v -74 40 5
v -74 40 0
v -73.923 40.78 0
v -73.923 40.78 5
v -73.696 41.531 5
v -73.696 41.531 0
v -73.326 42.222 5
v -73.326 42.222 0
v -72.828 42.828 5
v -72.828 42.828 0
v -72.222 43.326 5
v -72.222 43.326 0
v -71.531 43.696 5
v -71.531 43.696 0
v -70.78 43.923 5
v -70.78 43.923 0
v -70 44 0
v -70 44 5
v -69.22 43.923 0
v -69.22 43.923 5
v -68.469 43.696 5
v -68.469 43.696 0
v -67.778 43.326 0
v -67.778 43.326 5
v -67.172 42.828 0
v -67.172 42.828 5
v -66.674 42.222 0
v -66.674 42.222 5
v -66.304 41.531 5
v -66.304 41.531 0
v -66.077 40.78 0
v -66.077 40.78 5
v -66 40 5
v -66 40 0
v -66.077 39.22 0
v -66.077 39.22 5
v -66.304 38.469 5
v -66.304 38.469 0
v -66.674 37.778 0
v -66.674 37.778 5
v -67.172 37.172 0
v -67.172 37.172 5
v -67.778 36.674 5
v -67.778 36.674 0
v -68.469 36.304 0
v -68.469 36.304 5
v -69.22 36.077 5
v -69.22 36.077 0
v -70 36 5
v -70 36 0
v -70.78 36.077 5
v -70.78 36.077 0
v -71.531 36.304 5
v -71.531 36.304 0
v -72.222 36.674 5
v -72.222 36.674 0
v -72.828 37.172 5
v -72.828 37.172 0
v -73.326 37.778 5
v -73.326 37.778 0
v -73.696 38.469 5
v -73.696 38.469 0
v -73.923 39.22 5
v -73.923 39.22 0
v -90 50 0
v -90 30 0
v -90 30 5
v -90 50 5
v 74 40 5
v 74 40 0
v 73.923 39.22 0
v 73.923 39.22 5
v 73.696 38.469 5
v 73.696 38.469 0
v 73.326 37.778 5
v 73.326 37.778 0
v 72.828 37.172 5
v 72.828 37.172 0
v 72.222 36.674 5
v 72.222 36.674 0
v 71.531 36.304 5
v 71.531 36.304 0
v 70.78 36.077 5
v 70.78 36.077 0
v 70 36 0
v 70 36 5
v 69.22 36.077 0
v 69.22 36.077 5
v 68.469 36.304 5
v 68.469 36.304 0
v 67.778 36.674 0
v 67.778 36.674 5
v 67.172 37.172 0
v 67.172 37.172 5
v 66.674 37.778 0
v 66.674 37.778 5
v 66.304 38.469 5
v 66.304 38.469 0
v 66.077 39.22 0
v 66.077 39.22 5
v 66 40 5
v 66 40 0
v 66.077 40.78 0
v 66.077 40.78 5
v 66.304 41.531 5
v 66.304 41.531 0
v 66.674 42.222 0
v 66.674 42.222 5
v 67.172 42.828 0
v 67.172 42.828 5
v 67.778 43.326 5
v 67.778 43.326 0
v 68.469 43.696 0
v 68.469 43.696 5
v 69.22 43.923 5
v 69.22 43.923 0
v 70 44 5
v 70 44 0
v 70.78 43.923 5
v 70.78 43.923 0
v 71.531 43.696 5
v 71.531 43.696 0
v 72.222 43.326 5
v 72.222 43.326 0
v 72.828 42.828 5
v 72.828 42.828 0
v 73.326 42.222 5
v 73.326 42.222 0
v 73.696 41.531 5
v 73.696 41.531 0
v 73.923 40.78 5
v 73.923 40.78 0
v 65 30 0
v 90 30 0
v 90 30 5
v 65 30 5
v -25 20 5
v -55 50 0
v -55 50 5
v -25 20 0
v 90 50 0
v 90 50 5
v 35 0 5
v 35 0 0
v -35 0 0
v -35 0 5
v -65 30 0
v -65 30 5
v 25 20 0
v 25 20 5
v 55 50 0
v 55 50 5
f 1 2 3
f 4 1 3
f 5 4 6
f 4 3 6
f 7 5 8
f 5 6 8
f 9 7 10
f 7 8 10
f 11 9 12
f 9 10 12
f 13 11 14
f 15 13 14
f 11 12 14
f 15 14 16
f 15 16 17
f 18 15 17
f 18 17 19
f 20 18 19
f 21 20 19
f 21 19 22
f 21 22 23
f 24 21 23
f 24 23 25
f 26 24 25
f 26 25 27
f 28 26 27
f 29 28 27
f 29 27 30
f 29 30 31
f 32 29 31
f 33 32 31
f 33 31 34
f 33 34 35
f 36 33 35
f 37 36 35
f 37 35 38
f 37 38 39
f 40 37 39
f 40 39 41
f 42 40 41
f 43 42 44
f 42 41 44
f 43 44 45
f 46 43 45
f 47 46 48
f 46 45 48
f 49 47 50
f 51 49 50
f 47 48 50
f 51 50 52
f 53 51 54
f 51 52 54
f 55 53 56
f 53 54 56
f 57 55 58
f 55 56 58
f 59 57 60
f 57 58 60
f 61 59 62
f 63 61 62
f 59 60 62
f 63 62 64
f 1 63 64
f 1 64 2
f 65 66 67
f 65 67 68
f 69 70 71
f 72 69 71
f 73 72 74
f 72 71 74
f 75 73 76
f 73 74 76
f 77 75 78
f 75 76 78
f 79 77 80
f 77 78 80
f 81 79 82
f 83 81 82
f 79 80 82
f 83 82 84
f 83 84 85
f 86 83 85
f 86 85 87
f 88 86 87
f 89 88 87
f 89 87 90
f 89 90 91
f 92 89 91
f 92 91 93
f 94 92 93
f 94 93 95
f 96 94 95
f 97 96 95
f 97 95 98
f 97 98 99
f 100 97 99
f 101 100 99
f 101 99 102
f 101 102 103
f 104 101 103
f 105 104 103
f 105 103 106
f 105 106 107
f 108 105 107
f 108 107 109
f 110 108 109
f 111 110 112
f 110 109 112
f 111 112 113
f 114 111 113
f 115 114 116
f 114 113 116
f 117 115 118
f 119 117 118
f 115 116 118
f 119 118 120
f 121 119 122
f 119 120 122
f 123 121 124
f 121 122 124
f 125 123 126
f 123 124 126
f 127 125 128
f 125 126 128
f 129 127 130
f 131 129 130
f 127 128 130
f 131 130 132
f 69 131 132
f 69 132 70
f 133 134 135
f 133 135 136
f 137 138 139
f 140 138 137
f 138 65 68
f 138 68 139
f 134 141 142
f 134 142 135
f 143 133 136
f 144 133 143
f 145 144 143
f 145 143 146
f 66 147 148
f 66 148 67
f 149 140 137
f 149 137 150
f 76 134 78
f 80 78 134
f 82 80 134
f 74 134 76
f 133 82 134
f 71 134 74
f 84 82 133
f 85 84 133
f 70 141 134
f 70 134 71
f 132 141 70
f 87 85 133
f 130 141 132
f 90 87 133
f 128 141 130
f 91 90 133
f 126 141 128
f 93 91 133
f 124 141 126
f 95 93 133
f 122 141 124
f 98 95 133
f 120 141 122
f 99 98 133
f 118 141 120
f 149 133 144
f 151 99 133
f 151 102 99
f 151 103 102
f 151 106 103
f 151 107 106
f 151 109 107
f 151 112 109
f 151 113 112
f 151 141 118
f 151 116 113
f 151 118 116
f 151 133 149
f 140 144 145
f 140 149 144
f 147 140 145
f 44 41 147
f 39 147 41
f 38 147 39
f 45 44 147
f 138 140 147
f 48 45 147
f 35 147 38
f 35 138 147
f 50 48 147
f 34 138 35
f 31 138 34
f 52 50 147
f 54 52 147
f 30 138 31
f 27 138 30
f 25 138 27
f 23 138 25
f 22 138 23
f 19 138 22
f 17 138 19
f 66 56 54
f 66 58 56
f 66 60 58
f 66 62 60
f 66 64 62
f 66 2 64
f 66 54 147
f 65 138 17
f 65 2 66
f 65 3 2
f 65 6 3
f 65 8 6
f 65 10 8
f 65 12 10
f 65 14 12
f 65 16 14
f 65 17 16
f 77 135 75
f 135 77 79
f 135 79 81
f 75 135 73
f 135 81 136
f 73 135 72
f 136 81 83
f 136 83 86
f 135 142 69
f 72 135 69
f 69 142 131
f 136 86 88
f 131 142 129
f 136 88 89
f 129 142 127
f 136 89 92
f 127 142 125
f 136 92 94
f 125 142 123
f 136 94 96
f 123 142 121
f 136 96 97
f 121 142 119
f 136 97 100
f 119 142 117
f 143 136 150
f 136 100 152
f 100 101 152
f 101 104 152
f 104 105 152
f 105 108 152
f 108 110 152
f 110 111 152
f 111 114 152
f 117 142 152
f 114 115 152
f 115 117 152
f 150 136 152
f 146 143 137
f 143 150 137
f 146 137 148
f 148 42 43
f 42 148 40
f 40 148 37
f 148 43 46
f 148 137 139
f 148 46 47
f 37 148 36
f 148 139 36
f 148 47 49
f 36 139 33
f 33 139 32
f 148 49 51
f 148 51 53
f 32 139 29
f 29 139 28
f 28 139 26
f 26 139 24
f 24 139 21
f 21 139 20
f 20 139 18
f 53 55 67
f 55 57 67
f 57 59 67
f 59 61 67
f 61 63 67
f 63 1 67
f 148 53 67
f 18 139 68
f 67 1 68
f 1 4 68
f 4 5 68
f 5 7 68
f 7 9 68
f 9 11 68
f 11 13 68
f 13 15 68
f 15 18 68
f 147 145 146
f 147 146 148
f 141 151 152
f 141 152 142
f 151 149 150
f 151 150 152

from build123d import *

# Parameters (mm, degrees)
EXTRUDE_1_DEPTH     = 5
SKETCH_2_R          = 4
CUT_EXTRUDE_1_DEPTH = 10


with BuildPart() as part:
    # 草图1 → 凸台-拉伸1 (new body)
    with BuildSketch(Plane.XY):
        Polygon((35, 0), (-35, 0), (-65, 30), (-90, 30), (-90, 50), (-55, 50), (-25, 20), (25, 20), (55, 50), (90, 50), (90, 30), (65, 30), align=None)
    extrude(amount=EXTRUDE_1_DEPTH)

    # 草图2 → 切除-拉伸1 (cut)
    with BuildSketch(Plane(origin=(0, 0, 0), x_dir=(-1, 0, 0), z_dir=(0, 0, -1))):
        with Locations((70, 40)):
            Circle(SKETCH_2_R)
        with Locations(Location((-70, 40, 0), (0, 0, 180))):
            Circle(SKETCH_2_R)
    extrude(amount=-CUT_EXTRUDE_1_DEPTH, mode=Mode.SUBTRACT)


solid = part.part
